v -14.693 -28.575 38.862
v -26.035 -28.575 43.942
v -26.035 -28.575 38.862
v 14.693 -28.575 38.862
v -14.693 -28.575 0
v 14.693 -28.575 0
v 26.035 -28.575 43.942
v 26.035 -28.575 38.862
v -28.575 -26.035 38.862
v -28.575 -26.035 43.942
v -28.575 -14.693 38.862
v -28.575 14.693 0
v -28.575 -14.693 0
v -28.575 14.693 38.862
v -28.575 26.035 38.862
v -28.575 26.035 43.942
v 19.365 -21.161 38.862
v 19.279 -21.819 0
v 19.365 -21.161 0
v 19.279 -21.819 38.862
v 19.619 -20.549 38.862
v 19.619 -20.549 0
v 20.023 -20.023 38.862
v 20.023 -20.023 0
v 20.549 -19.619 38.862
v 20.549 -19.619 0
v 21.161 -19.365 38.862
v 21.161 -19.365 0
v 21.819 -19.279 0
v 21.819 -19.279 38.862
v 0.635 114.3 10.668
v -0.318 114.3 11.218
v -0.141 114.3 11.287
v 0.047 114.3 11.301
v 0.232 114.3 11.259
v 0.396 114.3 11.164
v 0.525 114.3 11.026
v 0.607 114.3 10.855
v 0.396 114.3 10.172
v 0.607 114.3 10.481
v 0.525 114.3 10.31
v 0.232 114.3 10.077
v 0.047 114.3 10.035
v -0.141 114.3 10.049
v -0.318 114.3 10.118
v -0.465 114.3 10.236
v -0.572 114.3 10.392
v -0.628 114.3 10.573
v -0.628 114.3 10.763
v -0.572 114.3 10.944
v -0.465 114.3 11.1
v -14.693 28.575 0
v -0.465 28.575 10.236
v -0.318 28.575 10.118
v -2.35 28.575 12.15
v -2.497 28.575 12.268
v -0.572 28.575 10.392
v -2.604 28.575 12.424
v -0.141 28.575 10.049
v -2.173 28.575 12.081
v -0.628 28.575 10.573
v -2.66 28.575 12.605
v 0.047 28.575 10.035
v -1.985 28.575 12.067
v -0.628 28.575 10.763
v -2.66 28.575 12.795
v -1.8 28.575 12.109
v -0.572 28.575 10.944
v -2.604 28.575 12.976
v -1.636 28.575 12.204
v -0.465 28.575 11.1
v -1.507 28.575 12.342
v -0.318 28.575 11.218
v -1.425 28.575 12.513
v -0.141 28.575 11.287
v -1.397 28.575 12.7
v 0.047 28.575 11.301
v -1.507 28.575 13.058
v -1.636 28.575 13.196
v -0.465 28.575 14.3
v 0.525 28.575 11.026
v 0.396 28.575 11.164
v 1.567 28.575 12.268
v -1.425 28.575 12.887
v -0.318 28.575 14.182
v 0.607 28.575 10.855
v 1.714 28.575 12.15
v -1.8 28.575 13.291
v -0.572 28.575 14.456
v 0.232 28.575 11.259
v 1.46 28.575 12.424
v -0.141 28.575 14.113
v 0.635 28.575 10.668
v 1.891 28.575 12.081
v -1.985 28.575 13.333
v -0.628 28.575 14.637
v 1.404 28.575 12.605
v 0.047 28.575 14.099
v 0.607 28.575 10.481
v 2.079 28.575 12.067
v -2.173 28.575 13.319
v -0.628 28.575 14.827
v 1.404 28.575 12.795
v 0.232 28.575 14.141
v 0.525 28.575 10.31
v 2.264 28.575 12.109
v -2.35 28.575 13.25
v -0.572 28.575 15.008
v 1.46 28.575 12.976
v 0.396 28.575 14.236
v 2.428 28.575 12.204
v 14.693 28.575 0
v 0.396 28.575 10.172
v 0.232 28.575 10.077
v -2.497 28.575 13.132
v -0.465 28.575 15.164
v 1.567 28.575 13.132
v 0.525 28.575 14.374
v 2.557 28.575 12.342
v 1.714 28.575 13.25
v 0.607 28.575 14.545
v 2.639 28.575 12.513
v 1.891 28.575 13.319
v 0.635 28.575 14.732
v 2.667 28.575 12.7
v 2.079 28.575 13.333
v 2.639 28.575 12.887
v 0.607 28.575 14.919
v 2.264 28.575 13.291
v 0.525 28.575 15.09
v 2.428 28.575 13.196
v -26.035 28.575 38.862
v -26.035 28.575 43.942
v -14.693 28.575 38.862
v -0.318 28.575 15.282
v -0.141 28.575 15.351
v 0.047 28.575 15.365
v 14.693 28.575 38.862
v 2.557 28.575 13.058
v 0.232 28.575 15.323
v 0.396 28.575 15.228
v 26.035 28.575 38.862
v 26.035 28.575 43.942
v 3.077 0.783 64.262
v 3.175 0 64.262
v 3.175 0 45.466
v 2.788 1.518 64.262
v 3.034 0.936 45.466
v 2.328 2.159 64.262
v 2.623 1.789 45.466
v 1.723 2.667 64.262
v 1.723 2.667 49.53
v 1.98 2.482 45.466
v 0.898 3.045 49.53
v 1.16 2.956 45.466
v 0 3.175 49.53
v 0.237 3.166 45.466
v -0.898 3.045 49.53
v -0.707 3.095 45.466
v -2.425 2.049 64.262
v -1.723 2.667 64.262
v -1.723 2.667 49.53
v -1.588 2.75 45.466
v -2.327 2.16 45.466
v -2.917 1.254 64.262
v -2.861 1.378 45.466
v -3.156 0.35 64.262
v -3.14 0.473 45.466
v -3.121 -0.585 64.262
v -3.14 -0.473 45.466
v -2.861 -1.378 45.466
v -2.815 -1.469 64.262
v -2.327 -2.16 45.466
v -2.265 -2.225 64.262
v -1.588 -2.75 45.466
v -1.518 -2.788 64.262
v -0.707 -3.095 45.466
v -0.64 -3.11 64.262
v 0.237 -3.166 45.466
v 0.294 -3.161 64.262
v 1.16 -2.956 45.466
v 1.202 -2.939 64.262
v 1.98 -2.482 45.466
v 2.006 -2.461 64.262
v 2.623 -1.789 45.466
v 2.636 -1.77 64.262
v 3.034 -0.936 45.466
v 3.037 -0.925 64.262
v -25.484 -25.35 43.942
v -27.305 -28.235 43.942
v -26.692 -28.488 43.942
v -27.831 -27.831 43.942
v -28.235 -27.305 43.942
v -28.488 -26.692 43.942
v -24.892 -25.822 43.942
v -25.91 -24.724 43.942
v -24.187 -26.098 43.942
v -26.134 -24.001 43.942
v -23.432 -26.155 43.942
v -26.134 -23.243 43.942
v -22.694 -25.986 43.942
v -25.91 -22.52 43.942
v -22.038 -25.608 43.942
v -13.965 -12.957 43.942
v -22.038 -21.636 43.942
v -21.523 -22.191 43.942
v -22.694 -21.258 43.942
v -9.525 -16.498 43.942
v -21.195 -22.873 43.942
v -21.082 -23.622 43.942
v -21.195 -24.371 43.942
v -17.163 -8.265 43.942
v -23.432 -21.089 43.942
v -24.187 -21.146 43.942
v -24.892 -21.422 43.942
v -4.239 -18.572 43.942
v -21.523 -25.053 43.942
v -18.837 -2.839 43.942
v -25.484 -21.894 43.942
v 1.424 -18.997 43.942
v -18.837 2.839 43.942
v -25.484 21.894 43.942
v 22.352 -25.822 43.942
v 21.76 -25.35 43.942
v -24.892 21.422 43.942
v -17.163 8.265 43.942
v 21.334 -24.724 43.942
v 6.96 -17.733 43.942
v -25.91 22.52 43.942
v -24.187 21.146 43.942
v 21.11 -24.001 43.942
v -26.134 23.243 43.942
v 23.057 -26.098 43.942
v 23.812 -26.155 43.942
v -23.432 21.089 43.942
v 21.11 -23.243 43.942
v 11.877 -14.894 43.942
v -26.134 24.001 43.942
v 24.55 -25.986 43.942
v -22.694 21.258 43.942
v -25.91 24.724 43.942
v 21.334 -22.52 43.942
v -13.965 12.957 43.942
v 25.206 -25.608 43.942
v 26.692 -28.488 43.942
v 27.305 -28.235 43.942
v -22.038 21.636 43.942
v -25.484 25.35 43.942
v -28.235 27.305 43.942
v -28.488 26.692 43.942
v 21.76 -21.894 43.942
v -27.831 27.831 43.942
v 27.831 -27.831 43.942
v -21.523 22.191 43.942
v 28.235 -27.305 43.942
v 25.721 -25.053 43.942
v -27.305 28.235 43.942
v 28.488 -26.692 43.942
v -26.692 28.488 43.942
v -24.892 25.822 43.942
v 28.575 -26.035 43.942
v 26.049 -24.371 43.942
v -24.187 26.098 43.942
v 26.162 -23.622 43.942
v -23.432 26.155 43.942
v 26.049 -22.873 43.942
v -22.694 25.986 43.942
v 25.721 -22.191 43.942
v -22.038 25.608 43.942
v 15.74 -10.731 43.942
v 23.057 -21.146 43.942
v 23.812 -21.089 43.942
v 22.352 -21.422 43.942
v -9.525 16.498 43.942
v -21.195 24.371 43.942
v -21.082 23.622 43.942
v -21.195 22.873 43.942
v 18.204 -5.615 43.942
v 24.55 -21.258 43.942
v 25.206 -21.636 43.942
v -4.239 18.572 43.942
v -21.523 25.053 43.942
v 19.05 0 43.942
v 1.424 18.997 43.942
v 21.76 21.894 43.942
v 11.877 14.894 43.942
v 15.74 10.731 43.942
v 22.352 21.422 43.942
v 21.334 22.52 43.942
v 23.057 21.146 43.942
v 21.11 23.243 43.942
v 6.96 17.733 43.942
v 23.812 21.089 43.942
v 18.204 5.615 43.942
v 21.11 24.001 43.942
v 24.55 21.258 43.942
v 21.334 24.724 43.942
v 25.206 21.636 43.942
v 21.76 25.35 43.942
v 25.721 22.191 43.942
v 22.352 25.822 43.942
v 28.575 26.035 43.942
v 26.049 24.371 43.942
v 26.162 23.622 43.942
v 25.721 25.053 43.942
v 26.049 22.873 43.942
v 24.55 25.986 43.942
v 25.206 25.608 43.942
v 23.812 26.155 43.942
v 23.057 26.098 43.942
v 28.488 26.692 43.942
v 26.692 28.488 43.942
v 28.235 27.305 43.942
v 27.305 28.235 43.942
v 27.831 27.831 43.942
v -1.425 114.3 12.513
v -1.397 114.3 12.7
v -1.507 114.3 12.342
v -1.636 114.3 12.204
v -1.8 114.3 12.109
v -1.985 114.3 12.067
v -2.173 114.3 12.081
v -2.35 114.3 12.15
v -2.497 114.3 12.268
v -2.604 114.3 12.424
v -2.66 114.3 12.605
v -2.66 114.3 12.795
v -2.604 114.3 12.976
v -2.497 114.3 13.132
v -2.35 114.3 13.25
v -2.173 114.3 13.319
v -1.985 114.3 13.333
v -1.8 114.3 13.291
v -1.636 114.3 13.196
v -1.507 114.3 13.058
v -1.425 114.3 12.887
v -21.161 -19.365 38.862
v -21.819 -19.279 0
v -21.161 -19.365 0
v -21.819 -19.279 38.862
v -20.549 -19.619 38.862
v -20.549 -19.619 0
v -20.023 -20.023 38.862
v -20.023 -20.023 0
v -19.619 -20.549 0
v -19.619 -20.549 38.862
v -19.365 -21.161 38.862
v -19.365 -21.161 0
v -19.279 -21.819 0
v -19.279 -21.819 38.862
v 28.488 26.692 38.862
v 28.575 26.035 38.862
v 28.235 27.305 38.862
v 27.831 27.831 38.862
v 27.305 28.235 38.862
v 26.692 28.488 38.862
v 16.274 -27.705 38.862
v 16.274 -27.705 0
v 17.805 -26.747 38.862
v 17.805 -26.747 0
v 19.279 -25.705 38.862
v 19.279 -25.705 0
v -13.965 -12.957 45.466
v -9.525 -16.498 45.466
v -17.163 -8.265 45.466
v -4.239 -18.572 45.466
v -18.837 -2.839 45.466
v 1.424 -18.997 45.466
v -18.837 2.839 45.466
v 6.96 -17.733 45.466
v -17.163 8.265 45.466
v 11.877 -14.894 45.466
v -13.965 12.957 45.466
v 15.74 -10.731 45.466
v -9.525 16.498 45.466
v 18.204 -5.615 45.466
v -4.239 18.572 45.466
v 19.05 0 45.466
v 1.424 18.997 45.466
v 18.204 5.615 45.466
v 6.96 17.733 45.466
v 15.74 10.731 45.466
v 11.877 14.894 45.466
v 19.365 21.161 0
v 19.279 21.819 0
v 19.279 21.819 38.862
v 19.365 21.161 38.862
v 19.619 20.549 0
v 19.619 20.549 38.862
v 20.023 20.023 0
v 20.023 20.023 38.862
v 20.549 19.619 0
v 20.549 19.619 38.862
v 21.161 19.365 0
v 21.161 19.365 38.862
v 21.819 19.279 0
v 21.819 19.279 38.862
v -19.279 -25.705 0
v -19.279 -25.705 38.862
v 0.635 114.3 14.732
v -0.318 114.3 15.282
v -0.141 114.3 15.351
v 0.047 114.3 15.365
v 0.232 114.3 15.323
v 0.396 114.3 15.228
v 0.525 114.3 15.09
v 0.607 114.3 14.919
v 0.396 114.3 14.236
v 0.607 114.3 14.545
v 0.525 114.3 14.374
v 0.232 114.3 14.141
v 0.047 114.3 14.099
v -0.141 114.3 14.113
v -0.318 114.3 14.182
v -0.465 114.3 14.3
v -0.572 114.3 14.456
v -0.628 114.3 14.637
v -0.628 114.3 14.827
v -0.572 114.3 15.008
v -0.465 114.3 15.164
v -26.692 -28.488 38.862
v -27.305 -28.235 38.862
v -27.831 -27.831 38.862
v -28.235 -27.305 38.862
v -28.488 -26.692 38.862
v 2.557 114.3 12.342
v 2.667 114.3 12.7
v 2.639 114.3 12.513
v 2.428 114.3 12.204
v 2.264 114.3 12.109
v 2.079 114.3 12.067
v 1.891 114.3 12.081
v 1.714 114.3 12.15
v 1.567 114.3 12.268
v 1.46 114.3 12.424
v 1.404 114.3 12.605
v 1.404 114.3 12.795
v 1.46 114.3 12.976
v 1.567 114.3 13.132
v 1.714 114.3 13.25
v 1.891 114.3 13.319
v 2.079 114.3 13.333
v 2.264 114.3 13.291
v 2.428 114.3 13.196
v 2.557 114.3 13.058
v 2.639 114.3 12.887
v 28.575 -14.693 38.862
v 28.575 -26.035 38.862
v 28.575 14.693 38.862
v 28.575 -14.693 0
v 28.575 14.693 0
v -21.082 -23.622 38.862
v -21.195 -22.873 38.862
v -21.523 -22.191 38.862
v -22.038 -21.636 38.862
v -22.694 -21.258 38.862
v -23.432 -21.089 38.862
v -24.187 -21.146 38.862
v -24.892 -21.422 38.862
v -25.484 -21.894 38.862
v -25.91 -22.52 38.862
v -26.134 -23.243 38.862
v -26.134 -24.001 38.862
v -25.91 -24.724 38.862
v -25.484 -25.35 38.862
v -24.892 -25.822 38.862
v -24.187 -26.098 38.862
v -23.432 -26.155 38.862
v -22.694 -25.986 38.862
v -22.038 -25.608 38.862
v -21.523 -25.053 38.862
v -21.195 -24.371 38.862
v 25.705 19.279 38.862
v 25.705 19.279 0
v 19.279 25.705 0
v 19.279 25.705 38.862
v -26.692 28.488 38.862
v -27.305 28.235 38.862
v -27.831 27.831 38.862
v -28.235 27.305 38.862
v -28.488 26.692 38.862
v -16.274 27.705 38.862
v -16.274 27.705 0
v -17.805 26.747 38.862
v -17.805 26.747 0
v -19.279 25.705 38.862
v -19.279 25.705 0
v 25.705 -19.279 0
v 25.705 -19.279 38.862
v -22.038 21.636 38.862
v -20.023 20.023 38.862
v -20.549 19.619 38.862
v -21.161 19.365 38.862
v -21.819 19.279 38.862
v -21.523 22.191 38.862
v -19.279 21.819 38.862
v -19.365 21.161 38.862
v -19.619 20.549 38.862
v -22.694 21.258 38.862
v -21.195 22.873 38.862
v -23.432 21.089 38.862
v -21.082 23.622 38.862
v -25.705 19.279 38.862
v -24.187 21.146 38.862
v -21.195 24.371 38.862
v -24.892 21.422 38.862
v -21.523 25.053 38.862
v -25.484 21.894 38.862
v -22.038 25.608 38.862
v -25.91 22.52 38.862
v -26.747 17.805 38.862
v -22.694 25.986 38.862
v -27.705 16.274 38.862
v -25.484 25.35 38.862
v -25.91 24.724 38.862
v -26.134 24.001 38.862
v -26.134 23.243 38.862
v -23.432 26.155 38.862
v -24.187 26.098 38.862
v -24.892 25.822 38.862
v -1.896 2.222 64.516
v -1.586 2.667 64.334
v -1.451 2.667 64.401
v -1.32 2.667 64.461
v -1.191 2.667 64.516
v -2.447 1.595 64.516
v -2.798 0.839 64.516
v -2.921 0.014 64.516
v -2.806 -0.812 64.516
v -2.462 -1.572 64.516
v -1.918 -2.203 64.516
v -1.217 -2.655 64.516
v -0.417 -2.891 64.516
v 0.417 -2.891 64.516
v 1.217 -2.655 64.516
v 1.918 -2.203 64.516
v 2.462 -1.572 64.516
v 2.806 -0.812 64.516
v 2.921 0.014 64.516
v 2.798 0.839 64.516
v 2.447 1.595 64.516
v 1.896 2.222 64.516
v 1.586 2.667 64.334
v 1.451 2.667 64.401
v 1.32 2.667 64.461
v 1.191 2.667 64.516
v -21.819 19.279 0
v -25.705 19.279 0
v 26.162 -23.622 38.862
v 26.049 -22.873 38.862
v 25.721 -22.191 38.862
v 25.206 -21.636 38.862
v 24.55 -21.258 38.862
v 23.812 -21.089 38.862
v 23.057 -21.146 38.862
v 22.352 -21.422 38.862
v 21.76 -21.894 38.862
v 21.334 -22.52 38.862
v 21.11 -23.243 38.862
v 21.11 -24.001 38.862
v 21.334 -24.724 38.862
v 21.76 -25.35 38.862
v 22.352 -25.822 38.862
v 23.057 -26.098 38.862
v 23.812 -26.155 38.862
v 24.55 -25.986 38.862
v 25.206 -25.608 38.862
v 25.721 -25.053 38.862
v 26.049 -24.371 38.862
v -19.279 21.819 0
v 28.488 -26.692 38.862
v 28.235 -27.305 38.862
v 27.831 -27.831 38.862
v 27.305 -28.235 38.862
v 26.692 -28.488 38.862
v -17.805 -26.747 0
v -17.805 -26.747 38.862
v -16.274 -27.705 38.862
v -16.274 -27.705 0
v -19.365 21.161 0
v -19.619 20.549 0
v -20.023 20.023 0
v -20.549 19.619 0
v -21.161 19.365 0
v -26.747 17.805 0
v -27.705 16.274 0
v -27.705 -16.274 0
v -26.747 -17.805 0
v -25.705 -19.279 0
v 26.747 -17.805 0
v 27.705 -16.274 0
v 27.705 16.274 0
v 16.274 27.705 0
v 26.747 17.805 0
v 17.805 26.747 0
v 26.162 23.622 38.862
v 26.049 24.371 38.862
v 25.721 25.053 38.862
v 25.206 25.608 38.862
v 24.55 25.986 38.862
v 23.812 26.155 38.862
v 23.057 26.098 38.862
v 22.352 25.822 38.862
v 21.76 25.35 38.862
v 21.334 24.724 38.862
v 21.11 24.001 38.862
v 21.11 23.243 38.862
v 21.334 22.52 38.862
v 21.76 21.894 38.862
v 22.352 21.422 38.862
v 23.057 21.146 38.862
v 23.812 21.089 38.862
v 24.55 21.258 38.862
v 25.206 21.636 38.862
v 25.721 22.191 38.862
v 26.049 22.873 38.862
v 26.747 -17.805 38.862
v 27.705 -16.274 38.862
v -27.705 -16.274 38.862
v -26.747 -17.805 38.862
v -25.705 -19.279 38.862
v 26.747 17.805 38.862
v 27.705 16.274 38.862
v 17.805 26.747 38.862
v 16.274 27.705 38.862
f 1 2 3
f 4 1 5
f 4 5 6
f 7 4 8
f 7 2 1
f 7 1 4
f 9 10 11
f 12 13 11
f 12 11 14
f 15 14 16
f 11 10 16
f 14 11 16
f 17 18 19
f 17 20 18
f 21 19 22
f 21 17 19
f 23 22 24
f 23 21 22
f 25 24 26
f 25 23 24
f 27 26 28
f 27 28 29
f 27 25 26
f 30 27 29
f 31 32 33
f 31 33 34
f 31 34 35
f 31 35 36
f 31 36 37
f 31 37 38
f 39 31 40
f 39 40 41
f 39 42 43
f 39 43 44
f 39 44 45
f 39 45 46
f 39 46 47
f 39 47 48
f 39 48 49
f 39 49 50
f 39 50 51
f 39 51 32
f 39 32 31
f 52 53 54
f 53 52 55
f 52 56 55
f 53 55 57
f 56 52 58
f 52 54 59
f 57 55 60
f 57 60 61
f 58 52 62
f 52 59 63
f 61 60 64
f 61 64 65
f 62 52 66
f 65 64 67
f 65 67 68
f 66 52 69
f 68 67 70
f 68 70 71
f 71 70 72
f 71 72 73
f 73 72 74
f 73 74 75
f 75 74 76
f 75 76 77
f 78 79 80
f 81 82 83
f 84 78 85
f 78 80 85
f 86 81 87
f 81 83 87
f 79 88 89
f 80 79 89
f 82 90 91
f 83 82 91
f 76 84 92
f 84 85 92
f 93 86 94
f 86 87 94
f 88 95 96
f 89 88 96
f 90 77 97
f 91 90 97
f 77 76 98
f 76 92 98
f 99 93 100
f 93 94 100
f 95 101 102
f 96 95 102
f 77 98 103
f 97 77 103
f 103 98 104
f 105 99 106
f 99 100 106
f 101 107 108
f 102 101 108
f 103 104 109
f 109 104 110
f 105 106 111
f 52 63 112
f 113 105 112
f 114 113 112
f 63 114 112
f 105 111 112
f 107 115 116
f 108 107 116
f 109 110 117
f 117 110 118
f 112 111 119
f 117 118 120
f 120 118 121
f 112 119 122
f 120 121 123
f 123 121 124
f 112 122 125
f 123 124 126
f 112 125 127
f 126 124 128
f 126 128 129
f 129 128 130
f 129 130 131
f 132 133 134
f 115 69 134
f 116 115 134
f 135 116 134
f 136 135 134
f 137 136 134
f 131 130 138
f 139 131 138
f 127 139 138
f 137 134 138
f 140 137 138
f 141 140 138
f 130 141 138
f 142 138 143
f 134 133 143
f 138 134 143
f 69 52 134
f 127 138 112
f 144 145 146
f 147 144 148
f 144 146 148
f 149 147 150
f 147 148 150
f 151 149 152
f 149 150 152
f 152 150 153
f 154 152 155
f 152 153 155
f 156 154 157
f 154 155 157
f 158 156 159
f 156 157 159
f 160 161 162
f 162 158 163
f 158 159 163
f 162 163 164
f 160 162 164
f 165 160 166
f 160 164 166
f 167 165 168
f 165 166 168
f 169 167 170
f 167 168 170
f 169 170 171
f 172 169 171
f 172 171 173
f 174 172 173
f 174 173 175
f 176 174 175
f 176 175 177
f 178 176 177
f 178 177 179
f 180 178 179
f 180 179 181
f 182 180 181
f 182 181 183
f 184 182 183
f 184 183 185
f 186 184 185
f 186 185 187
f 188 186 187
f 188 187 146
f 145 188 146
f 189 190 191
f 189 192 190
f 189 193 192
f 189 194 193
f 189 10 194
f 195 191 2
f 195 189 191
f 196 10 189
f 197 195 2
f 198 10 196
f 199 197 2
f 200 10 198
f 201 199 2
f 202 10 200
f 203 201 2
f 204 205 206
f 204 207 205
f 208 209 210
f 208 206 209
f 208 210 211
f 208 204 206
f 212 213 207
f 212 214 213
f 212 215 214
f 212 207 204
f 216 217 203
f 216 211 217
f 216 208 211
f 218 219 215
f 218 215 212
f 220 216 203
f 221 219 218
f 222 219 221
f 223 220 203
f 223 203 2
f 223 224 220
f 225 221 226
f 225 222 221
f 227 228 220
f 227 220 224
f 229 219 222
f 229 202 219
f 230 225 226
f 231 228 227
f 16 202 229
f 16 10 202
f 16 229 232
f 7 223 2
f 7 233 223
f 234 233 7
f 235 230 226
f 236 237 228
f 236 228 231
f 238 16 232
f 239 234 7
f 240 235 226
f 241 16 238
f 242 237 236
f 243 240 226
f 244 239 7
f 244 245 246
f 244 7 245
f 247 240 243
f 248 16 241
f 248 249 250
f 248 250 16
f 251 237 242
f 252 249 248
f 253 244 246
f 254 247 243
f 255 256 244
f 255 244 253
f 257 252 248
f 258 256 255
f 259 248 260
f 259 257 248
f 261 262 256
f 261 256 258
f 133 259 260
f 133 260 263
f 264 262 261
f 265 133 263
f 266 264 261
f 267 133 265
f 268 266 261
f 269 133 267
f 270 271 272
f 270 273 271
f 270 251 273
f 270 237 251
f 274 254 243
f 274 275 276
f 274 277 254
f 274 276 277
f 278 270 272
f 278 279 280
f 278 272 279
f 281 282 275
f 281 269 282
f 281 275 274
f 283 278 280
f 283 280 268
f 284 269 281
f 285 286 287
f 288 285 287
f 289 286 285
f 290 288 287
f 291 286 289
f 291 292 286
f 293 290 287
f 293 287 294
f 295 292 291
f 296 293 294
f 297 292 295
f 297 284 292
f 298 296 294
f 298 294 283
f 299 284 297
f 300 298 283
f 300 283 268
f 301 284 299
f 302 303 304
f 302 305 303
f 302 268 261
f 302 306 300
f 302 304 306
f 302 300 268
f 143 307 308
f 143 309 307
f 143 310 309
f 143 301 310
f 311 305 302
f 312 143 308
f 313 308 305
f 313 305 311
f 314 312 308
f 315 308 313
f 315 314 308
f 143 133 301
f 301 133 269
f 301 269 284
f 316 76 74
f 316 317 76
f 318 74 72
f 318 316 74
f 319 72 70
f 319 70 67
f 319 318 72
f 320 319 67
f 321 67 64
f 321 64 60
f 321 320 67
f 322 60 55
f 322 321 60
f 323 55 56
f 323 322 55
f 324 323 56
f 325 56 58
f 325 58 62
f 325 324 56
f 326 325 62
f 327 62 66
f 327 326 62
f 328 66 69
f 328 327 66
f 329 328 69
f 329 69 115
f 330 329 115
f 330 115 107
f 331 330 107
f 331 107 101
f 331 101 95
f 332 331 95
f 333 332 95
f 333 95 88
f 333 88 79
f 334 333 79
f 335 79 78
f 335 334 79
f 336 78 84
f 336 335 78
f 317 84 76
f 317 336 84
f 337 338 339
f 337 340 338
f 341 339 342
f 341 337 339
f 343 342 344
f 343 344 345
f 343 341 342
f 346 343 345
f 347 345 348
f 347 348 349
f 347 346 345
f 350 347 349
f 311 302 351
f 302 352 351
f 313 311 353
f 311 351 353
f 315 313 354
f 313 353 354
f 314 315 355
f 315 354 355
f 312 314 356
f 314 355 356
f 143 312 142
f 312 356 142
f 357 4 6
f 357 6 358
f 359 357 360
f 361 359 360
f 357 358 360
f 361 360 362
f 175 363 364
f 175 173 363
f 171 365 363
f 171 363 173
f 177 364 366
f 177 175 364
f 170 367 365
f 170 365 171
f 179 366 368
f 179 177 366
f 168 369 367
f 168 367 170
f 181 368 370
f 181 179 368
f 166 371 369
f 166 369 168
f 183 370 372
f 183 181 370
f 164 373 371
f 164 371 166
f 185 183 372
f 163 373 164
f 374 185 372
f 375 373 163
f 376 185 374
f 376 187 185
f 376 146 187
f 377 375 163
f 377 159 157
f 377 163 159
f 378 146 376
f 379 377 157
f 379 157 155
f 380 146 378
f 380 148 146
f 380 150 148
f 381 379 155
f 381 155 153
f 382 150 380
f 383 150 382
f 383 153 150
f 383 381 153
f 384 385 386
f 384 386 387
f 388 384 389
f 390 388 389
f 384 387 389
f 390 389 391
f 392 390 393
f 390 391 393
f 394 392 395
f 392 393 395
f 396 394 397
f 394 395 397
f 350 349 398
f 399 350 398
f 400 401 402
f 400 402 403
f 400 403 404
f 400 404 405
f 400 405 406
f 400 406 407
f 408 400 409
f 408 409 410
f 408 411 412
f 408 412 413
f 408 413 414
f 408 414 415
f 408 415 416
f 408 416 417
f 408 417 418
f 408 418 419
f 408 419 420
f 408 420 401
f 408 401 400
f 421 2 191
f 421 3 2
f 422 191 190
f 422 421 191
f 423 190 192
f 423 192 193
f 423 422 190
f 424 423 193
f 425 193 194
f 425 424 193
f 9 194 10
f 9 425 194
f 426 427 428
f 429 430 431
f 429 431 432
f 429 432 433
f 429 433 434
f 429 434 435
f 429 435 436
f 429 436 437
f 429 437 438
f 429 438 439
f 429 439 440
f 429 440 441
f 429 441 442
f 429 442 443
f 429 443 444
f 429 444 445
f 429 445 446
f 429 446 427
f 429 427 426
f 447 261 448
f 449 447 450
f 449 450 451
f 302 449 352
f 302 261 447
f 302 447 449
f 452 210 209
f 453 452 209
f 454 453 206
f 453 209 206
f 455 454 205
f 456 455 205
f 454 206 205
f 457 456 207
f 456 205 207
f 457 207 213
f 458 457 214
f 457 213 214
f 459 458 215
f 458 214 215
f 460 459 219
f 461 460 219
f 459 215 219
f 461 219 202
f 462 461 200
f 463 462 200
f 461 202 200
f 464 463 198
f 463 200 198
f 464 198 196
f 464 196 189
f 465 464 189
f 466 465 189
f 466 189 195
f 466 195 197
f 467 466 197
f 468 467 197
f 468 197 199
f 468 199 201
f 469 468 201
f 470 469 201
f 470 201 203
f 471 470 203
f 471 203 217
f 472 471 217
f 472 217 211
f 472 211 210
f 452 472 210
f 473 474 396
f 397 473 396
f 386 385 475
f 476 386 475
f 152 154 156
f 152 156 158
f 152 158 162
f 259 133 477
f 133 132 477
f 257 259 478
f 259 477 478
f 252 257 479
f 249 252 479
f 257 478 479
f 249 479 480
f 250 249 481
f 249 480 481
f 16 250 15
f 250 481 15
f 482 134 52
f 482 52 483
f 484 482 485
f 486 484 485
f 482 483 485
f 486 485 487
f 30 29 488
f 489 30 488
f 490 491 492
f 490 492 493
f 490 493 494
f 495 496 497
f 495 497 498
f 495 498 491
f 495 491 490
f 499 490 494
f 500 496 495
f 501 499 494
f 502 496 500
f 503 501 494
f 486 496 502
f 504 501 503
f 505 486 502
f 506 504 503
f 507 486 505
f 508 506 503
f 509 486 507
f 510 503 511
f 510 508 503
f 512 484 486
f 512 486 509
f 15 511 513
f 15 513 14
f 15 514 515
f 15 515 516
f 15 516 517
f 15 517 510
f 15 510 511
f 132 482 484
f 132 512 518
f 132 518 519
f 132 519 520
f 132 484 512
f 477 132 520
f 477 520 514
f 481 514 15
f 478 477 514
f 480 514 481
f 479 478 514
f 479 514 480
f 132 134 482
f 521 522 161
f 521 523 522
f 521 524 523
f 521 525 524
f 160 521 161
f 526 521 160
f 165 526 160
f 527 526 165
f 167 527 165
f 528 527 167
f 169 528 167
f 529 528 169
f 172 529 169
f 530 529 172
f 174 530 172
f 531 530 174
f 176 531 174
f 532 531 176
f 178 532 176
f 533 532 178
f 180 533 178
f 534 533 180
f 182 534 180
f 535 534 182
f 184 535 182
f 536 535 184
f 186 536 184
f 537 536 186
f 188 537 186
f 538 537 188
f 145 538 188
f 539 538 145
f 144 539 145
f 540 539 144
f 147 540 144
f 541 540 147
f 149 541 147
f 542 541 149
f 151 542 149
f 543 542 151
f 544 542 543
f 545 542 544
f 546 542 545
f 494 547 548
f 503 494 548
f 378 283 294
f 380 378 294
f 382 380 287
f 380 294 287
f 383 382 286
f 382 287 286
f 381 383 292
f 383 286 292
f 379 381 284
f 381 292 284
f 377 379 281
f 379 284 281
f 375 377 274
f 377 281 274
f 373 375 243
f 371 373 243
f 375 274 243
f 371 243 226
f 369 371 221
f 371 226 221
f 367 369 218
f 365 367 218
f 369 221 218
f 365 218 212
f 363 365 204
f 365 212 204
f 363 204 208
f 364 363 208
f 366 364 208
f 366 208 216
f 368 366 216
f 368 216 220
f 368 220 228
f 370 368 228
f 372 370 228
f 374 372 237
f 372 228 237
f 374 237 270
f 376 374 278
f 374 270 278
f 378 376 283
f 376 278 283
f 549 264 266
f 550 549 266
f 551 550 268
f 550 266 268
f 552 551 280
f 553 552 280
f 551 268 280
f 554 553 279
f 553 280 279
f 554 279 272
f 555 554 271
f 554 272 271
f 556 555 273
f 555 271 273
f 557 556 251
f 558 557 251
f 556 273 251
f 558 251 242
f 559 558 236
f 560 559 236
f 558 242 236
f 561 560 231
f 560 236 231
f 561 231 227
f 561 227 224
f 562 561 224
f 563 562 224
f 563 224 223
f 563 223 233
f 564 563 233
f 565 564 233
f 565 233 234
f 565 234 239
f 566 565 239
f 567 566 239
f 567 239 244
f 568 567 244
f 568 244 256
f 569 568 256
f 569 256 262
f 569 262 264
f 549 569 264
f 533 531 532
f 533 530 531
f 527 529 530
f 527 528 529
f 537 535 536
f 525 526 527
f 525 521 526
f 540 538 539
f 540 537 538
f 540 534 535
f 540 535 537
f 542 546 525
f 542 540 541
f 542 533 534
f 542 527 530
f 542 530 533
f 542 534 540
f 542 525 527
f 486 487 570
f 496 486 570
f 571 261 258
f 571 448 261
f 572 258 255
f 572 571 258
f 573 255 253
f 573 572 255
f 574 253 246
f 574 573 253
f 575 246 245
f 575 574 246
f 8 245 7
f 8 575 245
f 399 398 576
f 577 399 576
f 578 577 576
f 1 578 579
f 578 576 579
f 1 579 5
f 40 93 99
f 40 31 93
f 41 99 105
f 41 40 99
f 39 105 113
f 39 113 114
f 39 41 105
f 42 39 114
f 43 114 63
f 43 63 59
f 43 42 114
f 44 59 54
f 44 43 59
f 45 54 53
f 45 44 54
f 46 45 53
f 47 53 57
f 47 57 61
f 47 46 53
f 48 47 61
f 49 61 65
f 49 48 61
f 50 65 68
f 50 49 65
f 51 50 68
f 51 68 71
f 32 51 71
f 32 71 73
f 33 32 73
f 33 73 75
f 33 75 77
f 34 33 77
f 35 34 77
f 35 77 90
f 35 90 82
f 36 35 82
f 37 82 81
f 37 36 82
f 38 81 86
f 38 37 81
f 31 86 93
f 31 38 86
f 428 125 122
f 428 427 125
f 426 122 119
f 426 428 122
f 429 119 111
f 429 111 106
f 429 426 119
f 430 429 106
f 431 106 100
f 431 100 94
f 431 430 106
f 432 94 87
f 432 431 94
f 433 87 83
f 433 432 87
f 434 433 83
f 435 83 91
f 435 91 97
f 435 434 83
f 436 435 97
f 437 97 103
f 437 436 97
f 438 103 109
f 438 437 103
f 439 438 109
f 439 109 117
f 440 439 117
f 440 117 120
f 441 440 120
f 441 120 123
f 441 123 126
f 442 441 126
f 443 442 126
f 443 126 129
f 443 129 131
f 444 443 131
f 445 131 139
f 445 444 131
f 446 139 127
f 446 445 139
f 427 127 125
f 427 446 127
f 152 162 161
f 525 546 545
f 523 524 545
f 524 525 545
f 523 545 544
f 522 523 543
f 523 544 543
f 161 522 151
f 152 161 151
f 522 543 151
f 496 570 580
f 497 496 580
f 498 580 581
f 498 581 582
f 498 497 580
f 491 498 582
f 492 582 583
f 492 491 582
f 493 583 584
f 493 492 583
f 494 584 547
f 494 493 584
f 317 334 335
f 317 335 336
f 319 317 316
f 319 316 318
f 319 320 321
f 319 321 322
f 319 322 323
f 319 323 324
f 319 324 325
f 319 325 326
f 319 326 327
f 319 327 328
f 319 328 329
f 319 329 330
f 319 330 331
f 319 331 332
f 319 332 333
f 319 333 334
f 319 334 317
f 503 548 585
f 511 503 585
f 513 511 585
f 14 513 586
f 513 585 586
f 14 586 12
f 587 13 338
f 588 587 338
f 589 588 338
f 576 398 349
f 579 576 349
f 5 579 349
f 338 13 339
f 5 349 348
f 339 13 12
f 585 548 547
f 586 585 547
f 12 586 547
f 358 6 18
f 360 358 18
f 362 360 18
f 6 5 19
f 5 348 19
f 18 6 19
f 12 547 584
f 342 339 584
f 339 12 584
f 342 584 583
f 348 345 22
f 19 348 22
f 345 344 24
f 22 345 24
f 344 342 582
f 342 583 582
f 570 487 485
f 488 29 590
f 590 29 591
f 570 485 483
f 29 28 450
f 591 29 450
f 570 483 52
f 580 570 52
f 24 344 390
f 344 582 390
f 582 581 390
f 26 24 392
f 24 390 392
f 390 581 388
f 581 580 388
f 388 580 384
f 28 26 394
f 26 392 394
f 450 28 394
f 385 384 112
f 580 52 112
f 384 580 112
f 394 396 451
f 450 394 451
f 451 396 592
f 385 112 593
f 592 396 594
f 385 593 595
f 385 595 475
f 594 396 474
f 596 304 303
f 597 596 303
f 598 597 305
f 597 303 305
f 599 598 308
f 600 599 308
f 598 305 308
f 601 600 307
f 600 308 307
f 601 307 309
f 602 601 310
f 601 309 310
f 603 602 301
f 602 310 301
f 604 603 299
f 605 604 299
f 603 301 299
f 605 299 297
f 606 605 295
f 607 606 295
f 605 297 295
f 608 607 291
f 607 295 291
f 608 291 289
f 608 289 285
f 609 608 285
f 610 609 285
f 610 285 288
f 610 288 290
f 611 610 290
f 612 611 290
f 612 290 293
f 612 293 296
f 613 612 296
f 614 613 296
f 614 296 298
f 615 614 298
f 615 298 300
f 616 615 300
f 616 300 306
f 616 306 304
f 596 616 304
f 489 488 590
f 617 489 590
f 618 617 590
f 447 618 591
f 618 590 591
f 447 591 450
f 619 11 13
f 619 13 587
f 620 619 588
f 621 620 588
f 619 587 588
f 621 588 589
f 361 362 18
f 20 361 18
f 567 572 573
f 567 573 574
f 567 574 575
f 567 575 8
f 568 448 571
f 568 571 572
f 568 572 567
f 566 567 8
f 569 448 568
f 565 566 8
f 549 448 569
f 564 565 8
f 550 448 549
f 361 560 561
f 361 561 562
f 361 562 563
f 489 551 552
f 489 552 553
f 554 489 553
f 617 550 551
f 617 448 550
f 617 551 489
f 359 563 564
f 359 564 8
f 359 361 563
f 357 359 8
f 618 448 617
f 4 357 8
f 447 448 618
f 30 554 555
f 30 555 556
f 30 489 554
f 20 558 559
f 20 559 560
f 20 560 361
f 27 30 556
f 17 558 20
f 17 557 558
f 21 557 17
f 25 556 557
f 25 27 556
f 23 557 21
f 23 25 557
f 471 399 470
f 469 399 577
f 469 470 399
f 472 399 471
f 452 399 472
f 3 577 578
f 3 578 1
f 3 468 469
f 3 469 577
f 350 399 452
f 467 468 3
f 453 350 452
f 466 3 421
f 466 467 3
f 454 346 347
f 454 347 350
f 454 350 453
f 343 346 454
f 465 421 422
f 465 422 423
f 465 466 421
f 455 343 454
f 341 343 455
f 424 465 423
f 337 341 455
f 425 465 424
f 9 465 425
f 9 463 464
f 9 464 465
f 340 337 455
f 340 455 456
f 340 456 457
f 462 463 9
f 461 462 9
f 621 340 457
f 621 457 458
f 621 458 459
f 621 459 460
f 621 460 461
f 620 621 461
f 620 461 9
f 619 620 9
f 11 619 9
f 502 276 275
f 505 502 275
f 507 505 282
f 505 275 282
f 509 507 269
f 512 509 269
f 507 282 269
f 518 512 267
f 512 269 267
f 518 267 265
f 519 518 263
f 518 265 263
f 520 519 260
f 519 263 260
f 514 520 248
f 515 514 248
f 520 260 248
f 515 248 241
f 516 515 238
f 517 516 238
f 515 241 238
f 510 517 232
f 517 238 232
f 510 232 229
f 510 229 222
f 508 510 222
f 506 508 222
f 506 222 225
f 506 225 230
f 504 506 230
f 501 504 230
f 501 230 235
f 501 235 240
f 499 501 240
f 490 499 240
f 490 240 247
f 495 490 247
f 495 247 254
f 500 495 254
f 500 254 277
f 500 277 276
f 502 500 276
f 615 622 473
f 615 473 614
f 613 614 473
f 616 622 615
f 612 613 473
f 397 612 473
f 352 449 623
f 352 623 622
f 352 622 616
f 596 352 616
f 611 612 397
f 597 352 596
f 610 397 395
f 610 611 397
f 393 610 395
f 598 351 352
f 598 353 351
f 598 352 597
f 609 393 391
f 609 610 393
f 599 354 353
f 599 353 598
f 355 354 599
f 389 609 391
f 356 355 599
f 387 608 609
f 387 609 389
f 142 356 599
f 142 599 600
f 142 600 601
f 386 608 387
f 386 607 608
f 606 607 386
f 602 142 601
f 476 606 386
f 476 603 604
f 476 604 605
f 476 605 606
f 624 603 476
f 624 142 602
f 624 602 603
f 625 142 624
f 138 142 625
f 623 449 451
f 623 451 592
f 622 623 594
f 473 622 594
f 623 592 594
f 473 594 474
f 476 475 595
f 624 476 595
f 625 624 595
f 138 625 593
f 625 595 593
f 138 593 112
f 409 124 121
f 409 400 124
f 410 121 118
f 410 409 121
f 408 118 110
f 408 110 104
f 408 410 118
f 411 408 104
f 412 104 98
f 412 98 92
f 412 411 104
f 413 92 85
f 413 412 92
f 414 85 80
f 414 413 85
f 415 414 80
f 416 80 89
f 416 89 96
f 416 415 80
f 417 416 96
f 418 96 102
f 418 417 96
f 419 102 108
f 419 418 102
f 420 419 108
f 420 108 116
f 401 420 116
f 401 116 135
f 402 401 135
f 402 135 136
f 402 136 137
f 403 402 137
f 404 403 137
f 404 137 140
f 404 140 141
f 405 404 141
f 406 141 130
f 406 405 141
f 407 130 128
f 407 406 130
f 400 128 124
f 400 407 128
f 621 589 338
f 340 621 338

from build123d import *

# Parameters (mm, degrees)
ESQUISSE1_W             = 57.15
ESQUISSE1_H             = 57.15
BOSS_EXTRU_1_DEPTH      = 43.942
ENL_V_MAT_EXTRU_1_DEPTH = 38.862
ENL_V_MAT_EXTRU_2_DEPTH = 38.862
ENL_V_MAT_EXTRU_3_DEPTH = 38.862
ENL_V_MAT_EXTRU_4_DEPTH = 38.862
ENL_V_MAT_EXTRU_5_DEPTH = 38.862
ENL_V_MAT_EXTRU_6_DEPTH = 38.862
ENL_V_MAT_EXTRU_7_DEPTH = 38.862
ENL_V_MAT_EXTRU_8_DEPTH = 38.862
ESQUISSE10_R            = 19.05
BOSS_EXTRU_2_DEPTH      = 1.524
ESQUISSE11_R            = 3.175
BOSS_EXTRU_3_DEPTH      = 19.05
ENL_V_MAT_EXTRU_9_DEPTH = 14.986
ESQUISSE13_W            = 0.635
ESQUISSE13_H            = 85.725
ESQUISSE14_W            = 0.635
ESQUISSE14_H            = 85.725
ESQUISSE15_W            = 0.635
ESQUISSE15_H            = 85.725
ESQUISSE16_W            = 0.635
ESQUISSE16_H            = 85.725
PER_AGE1_D              = 5.08
PER_AGE1_DEPTH          = 25.654
CHANFREIN1_SIZE         = 0.254
CONG_1_R                = 2.54


with BuildPart() as part:
    # Esquisse1 → Boss.-Extru.1 (new body)
    with BuildSketch(Plane.XY.offset(43.942)):
        Rectangle(ESQUISSE1_W, ESQUISSE1_H)
    extrude(amount=-BOSS_EXTRU_1_DEPTH)

    # Esquisse2 → Enlèv. mat.-Extru.1 (cut)
    with BuildSketch(Plane(origin=(0, 0, 0), x_dir=(-1, 0, 0), z_dir=(0, 0, -1))):
        with BuildLine():
            Line((-28.575, -28.575), (-14.692533342, -28.575))
            ThreePointArc((-14.692533342, -28.575), (-22.720047986, -22.720047986), (-28.575, -14.692533342))
            Line((-28.575, -14.692533342), (-28.575, -28.575))
        make_face()
    extrude(amount=-ENL_V_MAT_EXTRU_1_DEPTH, mode=Mode.SUBTRACT)

    # Esquisse3 → Enlèv. mat.-Extru.2 (cut)
    with BuildSketch(Plane(origin=(0, 0, 0), x_dir=(-1, 0, 0), z_dir=(0, 0, -1))):
        with BuildLine():
            Line((-19.2786, -25.7048), (-19.2786, -19.2786))
            Line((-19.2786, -19.2786), (-25.7048, -19.2786))
            ThreePointArc((-25.7048, -19.2786), (-22.720047986, -22.720047986), (-19.2786, -25.7048))
        make_face()
    extrude(amount=-ENL_V_MAT_EXTRU_2_DEPTH, mode=Mode.SUBTRACT)

    # Esquisse4 → Enlèv. mat.-Extru.3 (cut)
    with BuildSketch(Plane(origin=(0, 0, 0), x_dir=(-1, 0, 0), z_dir=(0, 0, -1))):
        with BuildLine():
            Line((-28.575, 28.575), (-28.575, 14.692533342))
            ThreePointArc((-28.575, 14.692533342), (-22.720047986, 22.720047986), (-14.692533342, 28.575))
            Line((-14.692533342, 28.575), (-28.575, 28.575))
        make_face()
    extrude(amount=-ENL_V_MAT_EXTRU_3_DEPTH, mode=Mode.SUBTRACT)

    # Esquisse5 → Enlèv. mat.-Extru.4 (cut)
    with BuildSketch(Plane(origin=(0, 0, 0), x_dir=(-1, 0, 0), z_dir=(0, 0, -1))):
        with BuildLine():
            Line((-25.7048, 19.2786), (-19.2786, 19.2786))
            Line((-19.2786, 19.2786), (-19.2786, 25.7048))
            ThreePointArc((-19.2786, 25.7048), (-22.720047986, 22.720047986), (-25.7048, 19.2786))
        make_face()
    extrude(amount=-ENL_V_MAT_EXTRU_4_DEPTH, mode=Mode.SUBTRACT)

    # Esquisse6 → Enlèv. mat.-Extru.5 (cut)
    with BuildSketch(Plane(origin=(0, 0, 0), x_dir=(-1, 0, 0), z_dir=(0, 0, -1))):
        with BuildLine():
            Line((28.575, 28.575), (14.692533342, 28.575))
            ThreePointArc((14.692533342, 28.575), (22.720047986, 22.720047986), (28.575, 14.692533342))
            Line((28.575, 14.692533342), (28.575, 28.575))
        make_face()
    extrude(amount=-ENL_V_MAT_EXTRU_5_DEPTH, mode=Mode.SUBTRACT)

    # Esquisse7 → Enlèv. mat.-Extru.6 (cut)
    with BuildSketch(Plane(origin=(0, 0, 0), x_dir=(-1, 0, 0), z_dir=(0, 0, -1))):
        with BuildLine():
            Line((19.2786, 25.7048), (19.2786, 19.2786))
            Line((19.2786, 19.2786), (25.7048, 19.2786))
            ThreePointArc((25.7048, 19.2786), (22.720047986, 22.720047986), (19.2786, 25.7048))
        make_face()
    extrude(amount=-ENL_V_MAT_EXTRU_6_DEPTH, mode=Mode.SUBTRACT)

    # Esquisse8 → Enlèv. mat.-Extru.7 (cut)
    with BuildSketch(Plane(origin=(0, 0, 0), x_dir=(-1, 0, 0), z_dir=(0, 0, -1))):
        with BuildLine():
            Line((28.575, -28.575), (28.575, -14.692533342))
            ThreePointArc((28.575, -14.692533342), (22.720047986, -22.720047986), (14.692533342, -28.575))
            Line((14.692533342, -28.575), (28.575, -28.575))
        make_face()
    extrude(amount=-ENL_V_MAT_EXTRU_7_DEPTH, mode=Mode.SUBTRACT)

    # Esquisse9 → Enlèv. mat.-Extru.8 (cut)
    with BuildSketch(Plane(origin=(0, 0, 0), x_dir=(-1, 0, 0), z_dir=(0, 0, -1))):
        with BuildLine():
            Line((25.7048, -19.2786), (19.2786, -19.2786))
            Line((19.2786, -19.2786), (19.2786, -25.7048))
            ThreePointArc((19.2786, -25.7048), (22.720047986, -22.720047986), (25.7048, -19.2786))
        make_face()
    extrude(amount=-ENL_V_MAT_EXTRU_8_DEPTH, mode=Mode.SUBTRACT)

    # Esquisse10 → Boss.-Extru.2 (add)
    with BuildSketch(Plane.XY.offset(43.942)):
        Circle(ESQUISSE10_R)
    extrude(amount=BOSS_EXTRU_2_DEPTH)

    # Esquisse11 → Boss.-Extru.3 (add)
    with BuildSketch(Plane.XY.offset(45.466)):
        Circle(ESQUISSE11_R)
    extrude(amount=BOSS_EXTRU_3_DEPTH)

    # Esquisse12 → Enlèv. mat.-Extru.9 (cut)
    with BuildSketch(Plane.XY.offset(64.516)):
        with BuildLine():
            Line((-1.722711816, 2.667), (1.722711816, 2.667))
            ThreePointArc((1.722711816, 2.667), (0, 3.175), (-1.722711816, 2.667))
        make_face()
    extrude(amount=-ENL_V_MAT_EXTRU_9_DEPTH, mode=Mode.SUBTRACT)

    # Esquisse13 → Révolution1 (revolve)
    with BuildSketch(Plane(origin=(0, 0, 12.7), x_dir=(-1, 0, 0), z_dir=(0, 0, -1))):
        with Locations((1.7145, 71.4375)):
            Rectangle(ESQUISSE13_W, ESQUISSE13_H)
    revolve(axis=Axis((-2.032, 28.575, 12.7), (0, 1, 0)))

    # Esquisse14 → Révolution2 (revolve)
    with BuildSketch(Plane(origin=(0, 0, 12.7), x_dir=(-1, 0, 0), z_dir=(0, 0, -1))):
        with Locations((-2.3495, 71.4375)):
            Rectangle(ESQUISSE14_W, ESQUISSE14_H)
    revolve(axis=Axis((2.032, 28.575, 12.7), (0, 1, 0)))

    # Esquisse15 → Révolution3 (revolve)
    with BuildSketch(Plane(origin=(0, 0, 14.732), x_dir=(-1, 0, 0), z_dir=(0, 0, -1))):
        with Locations((-0.3175, 71.4375)):
            Rectangle(ESQUISSE15_W, ESQUISSE15_H)
    revolve(axis=Axis((0, 28.575, 14.732), (0, 1, 0)))

    # Esquisse16 → Révolution4 (revolve)
    with BuildSketch(Plane(origin=(0, 0, 10.668), x_dir=(-1, 0, 0), z_dir=(0, 0, -1))):
        with Locations((-0.3175, 71.4375)):
            Rectangle(ESQUISSE16_W, ESQUISSE16_H)
    revolve(axis=Axis((0, 28.575, 10.668), (0, 1, 0)))

    # Perçage1
    with Locations(Plane(origin=(0, 0, 38.862), x_dir=(-1, 0, 0), z_dir=(0, 0, -1))):
        with Locations((-23.622, -23.622), (-23.622, 23.622), (23.622, 23.622), (23.622, -23.622)):
            Hole(PER_AGE1_D / 2, depth=PER_AGE1_DEPTH)

    # Chanfrein1
    chanfrein1_edges = [part.edges().sort_by_distance(p)[0] for p in [
        (-1.51838977, -2.78838977, 64.516),
    ]]
    chamfer(chanfrein1_edges, length=CHANFREIN1_SIZE)

    # Congé1
    cong_1_edges = [part.edges().sort_by_distance(p)[0] for p in [
        (-19.2786, -19.2786, 19.431),
        (28.575, -28.575, 41.402),
        (19.2786, -19.2786, 19.431),
        (28.575, 28.575, 41.402),
        (19.2786, 19.2786, 19.431),
        (-28.575, 28.575, 41.402),
        (-19.2786, 19.2786, 19.431),
        (-28.575, -28.575, 41.402),
    ]]
    fillet(cong_1_edges, radius=CONG_1_R)


solid = part.part
